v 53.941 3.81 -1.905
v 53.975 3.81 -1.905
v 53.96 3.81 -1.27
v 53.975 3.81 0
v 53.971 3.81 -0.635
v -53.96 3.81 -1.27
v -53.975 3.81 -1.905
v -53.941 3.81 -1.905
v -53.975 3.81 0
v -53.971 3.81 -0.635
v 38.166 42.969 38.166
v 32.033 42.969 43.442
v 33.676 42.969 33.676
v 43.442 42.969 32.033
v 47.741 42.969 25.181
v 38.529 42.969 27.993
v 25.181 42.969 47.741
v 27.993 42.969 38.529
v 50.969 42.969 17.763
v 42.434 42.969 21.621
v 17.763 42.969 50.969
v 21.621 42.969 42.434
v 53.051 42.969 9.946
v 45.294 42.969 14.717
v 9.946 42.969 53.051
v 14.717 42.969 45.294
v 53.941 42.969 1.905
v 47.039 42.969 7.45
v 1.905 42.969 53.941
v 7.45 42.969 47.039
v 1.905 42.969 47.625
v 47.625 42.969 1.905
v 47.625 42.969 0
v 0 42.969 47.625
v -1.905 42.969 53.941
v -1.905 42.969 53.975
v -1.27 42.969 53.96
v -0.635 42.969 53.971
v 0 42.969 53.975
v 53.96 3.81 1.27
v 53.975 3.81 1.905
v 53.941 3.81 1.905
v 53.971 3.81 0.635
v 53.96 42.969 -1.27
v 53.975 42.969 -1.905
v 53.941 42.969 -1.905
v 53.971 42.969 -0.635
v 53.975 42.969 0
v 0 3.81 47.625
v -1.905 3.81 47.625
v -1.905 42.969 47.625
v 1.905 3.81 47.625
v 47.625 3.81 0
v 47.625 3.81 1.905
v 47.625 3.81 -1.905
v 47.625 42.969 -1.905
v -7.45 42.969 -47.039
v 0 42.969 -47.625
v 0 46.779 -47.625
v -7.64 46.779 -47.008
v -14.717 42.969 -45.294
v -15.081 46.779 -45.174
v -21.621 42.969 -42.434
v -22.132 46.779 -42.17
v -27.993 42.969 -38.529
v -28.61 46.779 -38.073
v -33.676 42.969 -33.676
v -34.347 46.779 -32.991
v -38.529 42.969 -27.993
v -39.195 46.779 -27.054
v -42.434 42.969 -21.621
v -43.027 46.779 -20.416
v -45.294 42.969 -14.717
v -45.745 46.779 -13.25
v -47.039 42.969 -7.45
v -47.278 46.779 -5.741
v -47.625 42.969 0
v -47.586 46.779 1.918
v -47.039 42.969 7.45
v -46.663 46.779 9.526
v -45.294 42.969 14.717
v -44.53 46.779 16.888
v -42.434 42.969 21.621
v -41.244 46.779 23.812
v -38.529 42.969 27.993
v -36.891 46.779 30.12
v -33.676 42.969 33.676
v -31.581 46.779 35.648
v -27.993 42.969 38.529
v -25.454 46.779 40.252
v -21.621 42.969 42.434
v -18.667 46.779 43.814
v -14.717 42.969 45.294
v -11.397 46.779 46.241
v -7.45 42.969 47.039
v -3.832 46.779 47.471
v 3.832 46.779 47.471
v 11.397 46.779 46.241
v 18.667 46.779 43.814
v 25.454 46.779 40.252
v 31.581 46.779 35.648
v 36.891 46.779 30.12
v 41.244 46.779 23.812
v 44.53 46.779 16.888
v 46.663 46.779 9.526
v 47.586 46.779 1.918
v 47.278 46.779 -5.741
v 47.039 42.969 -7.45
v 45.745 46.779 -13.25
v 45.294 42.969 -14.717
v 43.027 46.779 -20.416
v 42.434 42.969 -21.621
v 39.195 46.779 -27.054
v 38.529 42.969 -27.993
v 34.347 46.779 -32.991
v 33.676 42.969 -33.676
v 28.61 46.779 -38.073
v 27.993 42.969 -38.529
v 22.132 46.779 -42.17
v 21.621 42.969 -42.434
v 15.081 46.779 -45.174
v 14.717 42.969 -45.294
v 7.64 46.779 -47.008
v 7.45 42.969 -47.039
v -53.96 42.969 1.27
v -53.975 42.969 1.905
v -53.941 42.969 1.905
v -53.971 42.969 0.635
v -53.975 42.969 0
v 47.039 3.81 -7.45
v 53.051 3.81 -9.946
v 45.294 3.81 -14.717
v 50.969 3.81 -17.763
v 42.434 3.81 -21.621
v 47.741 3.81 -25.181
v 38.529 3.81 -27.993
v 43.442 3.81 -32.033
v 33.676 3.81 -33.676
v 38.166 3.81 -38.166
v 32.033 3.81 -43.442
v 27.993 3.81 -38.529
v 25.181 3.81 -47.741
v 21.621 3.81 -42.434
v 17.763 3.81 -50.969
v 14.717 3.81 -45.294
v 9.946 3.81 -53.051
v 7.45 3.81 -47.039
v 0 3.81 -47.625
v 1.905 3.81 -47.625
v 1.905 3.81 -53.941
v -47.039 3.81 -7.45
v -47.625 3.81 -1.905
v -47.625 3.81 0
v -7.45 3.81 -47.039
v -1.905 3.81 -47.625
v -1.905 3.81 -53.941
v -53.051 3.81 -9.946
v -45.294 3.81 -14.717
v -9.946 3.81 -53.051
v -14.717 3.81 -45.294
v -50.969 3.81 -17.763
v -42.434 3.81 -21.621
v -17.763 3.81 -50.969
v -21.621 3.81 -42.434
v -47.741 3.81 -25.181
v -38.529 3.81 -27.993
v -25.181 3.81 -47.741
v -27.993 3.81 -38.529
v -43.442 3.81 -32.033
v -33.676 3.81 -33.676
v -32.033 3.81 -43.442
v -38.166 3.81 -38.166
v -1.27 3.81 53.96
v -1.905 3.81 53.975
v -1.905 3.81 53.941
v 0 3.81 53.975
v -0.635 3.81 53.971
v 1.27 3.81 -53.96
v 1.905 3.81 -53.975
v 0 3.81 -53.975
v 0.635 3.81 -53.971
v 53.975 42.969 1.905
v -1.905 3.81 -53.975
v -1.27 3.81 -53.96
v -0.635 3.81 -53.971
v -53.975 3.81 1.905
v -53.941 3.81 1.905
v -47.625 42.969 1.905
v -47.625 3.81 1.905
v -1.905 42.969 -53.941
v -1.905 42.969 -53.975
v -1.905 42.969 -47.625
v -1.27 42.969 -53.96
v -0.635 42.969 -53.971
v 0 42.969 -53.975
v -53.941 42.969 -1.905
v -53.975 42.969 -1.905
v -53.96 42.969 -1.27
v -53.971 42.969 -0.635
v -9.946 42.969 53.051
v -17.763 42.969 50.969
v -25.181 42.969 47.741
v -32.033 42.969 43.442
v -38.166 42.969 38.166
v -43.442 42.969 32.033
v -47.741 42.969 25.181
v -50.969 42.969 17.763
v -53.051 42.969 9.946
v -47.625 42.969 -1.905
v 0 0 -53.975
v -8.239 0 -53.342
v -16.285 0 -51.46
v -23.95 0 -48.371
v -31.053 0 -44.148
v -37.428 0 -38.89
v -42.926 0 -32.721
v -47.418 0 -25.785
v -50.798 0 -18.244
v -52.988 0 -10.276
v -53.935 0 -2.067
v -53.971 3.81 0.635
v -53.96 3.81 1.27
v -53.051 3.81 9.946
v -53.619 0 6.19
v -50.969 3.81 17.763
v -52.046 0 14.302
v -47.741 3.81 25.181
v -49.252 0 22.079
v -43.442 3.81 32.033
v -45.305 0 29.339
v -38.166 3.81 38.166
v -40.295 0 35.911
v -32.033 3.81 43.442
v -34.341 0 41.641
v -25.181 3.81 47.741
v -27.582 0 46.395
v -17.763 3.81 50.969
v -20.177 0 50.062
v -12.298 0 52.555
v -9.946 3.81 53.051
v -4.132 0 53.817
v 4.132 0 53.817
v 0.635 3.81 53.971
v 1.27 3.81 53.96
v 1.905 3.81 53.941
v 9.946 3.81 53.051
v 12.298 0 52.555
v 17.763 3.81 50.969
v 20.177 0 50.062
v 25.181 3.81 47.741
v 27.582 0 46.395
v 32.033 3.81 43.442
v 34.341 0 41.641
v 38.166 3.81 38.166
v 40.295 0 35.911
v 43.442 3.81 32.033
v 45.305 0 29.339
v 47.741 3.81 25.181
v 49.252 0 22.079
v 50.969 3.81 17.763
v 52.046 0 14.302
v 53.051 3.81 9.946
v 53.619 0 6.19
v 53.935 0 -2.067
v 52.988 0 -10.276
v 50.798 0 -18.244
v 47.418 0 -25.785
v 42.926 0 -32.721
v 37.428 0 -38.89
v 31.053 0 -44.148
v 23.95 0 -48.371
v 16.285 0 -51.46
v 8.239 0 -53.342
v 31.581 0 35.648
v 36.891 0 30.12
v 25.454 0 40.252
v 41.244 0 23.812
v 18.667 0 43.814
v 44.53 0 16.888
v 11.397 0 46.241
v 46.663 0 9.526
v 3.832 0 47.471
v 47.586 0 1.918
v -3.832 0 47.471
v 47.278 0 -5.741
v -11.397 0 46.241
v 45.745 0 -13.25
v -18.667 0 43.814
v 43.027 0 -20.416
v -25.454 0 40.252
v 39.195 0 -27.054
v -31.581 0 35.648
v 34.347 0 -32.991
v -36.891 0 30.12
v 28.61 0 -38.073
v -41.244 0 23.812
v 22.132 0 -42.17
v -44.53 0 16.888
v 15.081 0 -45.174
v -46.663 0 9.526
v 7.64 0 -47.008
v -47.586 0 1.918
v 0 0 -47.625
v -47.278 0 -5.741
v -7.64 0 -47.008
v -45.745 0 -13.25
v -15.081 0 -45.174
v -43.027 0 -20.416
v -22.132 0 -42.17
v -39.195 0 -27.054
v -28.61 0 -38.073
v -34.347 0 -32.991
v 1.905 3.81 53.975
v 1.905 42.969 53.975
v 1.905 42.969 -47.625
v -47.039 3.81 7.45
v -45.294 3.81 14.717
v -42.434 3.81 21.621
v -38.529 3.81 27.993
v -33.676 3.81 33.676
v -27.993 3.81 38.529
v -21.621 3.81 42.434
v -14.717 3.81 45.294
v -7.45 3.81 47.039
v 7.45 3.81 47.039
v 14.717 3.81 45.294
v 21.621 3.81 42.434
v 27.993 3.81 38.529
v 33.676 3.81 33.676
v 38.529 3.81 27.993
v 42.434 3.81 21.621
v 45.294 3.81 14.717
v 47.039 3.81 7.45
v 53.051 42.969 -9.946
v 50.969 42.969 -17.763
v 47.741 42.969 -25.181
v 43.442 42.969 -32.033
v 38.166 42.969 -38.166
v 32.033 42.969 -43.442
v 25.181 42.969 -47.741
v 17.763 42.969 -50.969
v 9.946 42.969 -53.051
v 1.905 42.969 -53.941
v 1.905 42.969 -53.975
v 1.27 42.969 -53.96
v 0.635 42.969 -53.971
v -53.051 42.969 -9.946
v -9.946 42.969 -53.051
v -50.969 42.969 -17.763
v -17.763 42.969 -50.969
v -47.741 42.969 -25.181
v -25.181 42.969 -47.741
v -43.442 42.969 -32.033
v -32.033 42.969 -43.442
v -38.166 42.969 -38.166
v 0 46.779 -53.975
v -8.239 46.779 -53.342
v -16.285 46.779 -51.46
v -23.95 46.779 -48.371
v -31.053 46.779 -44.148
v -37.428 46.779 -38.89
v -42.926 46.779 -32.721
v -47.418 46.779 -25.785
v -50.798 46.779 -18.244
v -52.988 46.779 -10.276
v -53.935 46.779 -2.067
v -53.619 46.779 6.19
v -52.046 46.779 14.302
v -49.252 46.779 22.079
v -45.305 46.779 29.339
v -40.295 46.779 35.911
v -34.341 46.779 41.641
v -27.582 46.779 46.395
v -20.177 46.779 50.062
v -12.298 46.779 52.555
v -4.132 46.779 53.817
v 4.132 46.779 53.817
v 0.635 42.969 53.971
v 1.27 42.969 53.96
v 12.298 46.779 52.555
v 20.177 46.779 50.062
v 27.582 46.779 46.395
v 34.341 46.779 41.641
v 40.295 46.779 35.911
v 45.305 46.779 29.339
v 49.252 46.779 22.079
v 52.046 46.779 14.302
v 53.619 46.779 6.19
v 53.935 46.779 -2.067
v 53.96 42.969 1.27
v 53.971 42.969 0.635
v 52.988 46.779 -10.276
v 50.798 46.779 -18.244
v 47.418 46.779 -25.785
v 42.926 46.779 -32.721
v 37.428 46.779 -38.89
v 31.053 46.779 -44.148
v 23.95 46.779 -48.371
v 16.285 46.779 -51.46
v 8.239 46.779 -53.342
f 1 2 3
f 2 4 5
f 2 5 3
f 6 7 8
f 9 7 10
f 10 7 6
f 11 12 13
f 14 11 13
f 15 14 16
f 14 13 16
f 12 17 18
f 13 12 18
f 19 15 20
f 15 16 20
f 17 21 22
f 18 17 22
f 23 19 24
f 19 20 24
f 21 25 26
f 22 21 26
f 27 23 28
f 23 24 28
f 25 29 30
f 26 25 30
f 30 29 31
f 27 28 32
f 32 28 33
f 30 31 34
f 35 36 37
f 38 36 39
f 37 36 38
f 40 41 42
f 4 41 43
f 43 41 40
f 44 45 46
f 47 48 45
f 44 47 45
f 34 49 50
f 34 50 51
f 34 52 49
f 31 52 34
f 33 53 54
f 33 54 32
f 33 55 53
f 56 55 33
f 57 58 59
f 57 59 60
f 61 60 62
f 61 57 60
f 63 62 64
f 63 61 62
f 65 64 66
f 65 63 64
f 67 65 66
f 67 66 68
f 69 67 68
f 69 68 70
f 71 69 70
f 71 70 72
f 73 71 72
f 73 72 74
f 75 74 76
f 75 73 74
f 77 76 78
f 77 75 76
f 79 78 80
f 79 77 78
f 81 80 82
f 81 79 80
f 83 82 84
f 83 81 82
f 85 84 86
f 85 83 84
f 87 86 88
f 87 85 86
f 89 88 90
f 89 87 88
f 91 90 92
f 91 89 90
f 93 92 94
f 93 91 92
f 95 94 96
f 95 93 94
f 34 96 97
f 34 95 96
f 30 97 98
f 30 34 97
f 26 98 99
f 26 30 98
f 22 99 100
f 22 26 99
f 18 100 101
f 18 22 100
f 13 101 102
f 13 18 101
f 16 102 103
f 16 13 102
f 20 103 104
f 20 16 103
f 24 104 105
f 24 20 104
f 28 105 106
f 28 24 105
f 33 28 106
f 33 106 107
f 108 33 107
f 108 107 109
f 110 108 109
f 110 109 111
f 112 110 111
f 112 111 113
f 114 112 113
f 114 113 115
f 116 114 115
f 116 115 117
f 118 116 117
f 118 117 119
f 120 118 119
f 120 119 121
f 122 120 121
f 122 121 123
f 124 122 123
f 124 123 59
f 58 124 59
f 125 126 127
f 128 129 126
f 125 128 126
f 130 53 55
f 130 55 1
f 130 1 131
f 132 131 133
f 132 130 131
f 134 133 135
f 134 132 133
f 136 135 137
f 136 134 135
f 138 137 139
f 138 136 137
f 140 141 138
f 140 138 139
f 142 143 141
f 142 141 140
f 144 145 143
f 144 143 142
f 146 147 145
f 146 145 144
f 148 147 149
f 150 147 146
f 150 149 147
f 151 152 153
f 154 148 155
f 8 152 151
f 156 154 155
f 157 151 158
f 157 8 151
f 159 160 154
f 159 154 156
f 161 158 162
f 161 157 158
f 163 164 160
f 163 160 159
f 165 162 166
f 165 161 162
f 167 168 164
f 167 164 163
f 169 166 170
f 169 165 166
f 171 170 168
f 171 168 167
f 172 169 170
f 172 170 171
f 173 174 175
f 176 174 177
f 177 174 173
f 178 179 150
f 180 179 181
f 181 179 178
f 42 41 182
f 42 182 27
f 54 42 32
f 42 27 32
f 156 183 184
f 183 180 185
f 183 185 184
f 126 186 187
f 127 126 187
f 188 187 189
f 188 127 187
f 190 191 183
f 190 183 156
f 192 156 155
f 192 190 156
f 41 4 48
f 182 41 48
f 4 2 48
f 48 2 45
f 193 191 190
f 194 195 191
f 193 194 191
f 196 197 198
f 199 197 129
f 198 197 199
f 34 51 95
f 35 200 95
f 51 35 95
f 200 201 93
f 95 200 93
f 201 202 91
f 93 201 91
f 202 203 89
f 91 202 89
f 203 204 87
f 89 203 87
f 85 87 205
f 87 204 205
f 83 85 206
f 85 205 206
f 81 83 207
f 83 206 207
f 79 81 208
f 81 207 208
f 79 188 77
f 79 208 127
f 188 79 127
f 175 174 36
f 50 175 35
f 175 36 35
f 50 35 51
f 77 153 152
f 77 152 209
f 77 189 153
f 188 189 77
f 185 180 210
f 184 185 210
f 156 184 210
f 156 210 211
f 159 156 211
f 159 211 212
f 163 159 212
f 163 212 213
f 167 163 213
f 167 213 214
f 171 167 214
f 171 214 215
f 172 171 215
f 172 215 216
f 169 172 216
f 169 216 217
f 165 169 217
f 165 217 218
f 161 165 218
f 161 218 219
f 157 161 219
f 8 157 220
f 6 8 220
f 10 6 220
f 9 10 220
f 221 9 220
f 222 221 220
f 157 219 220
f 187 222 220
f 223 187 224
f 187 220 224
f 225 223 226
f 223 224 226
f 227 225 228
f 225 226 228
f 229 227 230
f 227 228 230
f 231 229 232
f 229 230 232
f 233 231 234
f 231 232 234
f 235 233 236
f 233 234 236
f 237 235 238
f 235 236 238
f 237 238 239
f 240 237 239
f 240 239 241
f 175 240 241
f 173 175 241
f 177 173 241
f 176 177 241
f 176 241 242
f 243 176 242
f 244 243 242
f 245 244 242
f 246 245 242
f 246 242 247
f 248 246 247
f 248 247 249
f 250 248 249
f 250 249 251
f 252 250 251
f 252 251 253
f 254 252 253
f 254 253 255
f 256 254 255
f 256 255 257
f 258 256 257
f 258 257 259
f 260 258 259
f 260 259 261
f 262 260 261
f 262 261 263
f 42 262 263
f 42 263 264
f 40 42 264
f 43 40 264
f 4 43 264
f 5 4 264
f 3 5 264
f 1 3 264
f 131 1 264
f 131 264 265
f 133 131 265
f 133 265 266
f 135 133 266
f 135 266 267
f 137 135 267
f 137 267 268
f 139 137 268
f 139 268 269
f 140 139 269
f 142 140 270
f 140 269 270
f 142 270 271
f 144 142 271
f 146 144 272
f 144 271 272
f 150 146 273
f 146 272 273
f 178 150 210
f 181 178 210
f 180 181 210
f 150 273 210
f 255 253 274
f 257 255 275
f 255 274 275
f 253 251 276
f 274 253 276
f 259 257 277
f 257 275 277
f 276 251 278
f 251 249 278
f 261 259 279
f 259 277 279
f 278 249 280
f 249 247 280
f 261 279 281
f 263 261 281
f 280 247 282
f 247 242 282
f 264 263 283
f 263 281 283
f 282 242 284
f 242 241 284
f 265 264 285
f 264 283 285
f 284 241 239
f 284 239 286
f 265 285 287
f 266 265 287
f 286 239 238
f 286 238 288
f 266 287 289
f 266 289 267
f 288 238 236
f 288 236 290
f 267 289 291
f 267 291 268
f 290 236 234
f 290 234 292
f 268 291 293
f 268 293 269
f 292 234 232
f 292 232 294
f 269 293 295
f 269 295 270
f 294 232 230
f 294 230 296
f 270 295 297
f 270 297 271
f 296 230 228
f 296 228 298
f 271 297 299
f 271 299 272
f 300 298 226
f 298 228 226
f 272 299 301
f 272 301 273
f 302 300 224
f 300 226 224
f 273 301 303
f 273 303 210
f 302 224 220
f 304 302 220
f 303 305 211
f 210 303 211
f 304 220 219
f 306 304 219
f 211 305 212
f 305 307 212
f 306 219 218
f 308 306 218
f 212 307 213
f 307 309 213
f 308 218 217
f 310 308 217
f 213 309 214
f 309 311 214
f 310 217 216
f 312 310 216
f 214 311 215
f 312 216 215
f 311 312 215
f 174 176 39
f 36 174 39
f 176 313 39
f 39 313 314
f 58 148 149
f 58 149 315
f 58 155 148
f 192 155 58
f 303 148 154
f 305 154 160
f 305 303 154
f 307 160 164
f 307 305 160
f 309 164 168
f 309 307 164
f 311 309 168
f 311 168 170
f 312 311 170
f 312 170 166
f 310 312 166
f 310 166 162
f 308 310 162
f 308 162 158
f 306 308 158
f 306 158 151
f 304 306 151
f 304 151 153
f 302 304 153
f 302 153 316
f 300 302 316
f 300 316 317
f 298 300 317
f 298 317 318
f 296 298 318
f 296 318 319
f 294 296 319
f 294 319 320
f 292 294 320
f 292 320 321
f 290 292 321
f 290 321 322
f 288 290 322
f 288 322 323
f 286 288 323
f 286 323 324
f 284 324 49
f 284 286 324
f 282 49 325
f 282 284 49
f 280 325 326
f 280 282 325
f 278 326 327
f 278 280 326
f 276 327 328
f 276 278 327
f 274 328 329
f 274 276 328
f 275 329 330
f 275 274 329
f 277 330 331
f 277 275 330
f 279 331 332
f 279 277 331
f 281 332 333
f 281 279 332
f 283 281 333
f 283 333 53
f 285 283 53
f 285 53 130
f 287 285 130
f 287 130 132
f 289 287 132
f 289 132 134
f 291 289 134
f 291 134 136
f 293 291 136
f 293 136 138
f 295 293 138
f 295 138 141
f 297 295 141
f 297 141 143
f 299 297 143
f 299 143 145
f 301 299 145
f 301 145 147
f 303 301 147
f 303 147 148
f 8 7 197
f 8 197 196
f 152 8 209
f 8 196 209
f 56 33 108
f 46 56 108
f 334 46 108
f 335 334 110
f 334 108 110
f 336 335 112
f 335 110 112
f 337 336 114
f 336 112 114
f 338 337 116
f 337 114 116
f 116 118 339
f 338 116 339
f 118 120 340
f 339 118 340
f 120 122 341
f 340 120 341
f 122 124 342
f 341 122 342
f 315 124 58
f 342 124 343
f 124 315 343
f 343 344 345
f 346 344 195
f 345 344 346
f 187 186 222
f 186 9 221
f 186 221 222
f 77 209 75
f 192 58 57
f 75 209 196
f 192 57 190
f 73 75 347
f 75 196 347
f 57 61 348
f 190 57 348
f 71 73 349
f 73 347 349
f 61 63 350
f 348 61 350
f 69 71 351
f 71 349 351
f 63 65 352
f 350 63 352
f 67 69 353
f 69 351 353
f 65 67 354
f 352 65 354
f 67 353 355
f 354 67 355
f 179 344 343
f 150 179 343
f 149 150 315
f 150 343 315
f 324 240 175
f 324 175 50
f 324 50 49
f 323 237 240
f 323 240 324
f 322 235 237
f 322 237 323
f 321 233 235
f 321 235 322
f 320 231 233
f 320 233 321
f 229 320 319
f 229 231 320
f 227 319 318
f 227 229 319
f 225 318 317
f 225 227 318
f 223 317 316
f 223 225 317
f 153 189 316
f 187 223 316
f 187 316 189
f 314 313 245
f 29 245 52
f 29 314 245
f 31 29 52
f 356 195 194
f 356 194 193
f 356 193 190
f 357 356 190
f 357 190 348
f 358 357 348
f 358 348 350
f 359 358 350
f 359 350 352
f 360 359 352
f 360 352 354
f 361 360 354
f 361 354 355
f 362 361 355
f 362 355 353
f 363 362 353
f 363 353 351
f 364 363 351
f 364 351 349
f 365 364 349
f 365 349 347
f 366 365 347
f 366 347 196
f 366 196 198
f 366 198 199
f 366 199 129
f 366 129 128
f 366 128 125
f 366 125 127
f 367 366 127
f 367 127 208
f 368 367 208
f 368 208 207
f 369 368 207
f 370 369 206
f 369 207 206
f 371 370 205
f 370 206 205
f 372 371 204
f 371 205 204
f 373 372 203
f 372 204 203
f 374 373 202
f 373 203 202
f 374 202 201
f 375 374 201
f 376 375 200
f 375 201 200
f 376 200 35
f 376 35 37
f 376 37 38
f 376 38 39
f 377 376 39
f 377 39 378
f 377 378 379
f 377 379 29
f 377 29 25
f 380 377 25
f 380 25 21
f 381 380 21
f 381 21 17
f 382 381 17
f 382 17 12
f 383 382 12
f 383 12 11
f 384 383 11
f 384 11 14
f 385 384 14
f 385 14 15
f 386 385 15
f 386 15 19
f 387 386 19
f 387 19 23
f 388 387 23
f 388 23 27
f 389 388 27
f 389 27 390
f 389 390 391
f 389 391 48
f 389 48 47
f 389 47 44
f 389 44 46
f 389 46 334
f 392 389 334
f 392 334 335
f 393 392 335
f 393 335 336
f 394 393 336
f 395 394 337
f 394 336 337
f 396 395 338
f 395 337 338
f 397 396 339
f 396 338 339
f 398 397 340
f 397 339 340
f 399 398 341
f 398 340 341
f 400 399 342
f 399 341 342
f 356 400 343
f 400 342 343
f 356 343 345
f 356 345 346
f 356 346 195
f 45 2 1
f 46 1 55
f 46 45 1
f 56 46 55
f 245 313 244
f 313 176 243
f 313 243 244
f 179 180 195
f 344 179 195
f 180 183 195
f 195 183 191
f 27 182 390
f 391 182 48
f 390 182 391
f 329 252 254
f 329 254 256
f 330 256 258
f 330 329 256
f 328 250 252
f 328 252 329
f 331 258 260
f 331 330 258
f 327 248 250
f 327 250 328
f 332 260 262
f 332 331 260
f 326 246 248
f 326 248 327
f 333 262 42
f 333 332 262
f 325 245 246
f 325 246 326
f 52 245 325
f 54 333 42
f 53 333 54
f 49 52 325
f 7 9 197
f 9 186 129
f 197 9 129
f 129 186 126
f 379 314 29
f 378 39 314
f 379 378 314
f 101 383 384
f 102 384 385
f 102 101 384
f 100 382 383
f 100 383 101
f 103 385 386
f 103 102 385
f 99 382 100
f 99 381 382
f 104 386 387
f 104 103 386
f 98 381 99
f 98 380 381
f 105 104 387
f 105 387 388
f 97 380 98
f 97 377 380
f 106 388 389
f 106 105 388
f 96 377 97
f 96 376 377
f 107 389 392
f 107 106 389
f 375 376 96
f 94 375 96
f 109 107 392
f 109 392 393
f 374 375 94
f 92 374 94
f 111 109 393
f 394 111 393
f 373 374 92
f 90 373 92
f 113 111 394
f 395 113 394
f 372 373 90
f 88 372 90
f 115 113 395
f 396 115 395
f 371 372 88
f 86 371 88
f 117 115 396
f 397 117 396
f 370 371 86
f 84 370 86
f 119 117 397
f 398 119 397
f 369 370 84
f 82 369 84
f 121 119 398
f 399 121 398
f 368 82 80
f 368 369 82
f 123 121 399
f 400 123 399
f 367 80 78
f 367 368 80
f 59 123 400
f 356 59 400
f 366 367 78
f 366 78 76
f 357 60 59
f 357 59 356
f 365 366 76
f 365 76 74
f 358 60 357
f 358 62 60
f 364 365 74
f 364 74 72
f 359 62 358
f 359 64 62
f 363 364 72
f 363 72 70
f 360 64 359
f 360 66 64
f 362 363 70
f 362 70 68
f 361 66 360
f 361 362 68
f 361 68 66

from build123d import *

# Parameters (mm, degrees)
SKETCH1_R           = 53.975
SKETCH1_R_2         = 47.625
BOSS_EXTRUDE1_DEPTH = 3.81
SKETCH2_R           = 53.975
SKETCH2_R_2         = 47.625
BOSS_EXTRUDE2_DEPTH = 3.81
SKETCH4_W           = 6.35
SKETCH4_H           = 39.15918
BOSS_EXTRUDE3_DEPTH = 1.905
CIRPATTERN1_COUNT   = 4


with BuildPart() as part:
    # Sketch1 → Boss-Extrude1 (new body)
    with BuildSketch(Plane(origin=(0, 0, 0), x_dir=(1, 0, 0), z_dir=(0, 1, 0))):
        with Locations(Location((0, 0, 0), (0, 0, 90))):
            Circle(SKETCH1_R)
        with Locations(Location((0, 0, 0), (0, 0, 90))):
            Circle(SKETCH1_R_2, mode=Mode.SUBTRACT)
    extrude(amount=BOSS_EXTRUDE1_DEPTH)



with BuildPart() as body_2:
    # Sketch2 → Boss-Extrude2 (new body)
    with BuildSketch(Plane(origin=(0, 42.96918, 0), x_dir=(1, 0, 0), z_dir=(0, 1, 0))):
        with Locations(Location((0, 0, 0), (0, 0, 90))):
            Circle(SKETCH2_R)
        with Locations(Location((0, 0, 0), (0, 0, 90))):
            Circle(SKETCH2_R_2, mode=Mode.SUBTRACT)
    extrude(amount=BOSS_EXTRUDE2_DEPTH)


with BuildPart() as part_1:
    add(part.part)

    add(body_2.part)  # Boss-Extrude3 merges body 2
    # Sketch4 → Boss-Extrude3 (add, symmetric)
    with BuildSketch(Plane(origin=(0, 0, 0), x_dir=(0, 0, -1), z_dir=(1, 0, 0))):
        with Locations((-50.8, 23.38959)):
            Rectangle(SKETCH4_W, SKETCH4_H)
    boss_extrude3 = extrude(amount=BOSS_EXTRUDE3_DEPTH, both=True)

    # CirPattern1: Boss-Extrude3 ×4 about axis
    cirpattern1_axis = Axis((0, 0, 0), (0, 1, 0))
    for i in range(1, CIRPATTERN1_COUNT):
        add(boss_extrude3.rotate(cirpattern1_axis, i * 360 / CIRPATTERN1_COUNT))


solid = part_1.part
